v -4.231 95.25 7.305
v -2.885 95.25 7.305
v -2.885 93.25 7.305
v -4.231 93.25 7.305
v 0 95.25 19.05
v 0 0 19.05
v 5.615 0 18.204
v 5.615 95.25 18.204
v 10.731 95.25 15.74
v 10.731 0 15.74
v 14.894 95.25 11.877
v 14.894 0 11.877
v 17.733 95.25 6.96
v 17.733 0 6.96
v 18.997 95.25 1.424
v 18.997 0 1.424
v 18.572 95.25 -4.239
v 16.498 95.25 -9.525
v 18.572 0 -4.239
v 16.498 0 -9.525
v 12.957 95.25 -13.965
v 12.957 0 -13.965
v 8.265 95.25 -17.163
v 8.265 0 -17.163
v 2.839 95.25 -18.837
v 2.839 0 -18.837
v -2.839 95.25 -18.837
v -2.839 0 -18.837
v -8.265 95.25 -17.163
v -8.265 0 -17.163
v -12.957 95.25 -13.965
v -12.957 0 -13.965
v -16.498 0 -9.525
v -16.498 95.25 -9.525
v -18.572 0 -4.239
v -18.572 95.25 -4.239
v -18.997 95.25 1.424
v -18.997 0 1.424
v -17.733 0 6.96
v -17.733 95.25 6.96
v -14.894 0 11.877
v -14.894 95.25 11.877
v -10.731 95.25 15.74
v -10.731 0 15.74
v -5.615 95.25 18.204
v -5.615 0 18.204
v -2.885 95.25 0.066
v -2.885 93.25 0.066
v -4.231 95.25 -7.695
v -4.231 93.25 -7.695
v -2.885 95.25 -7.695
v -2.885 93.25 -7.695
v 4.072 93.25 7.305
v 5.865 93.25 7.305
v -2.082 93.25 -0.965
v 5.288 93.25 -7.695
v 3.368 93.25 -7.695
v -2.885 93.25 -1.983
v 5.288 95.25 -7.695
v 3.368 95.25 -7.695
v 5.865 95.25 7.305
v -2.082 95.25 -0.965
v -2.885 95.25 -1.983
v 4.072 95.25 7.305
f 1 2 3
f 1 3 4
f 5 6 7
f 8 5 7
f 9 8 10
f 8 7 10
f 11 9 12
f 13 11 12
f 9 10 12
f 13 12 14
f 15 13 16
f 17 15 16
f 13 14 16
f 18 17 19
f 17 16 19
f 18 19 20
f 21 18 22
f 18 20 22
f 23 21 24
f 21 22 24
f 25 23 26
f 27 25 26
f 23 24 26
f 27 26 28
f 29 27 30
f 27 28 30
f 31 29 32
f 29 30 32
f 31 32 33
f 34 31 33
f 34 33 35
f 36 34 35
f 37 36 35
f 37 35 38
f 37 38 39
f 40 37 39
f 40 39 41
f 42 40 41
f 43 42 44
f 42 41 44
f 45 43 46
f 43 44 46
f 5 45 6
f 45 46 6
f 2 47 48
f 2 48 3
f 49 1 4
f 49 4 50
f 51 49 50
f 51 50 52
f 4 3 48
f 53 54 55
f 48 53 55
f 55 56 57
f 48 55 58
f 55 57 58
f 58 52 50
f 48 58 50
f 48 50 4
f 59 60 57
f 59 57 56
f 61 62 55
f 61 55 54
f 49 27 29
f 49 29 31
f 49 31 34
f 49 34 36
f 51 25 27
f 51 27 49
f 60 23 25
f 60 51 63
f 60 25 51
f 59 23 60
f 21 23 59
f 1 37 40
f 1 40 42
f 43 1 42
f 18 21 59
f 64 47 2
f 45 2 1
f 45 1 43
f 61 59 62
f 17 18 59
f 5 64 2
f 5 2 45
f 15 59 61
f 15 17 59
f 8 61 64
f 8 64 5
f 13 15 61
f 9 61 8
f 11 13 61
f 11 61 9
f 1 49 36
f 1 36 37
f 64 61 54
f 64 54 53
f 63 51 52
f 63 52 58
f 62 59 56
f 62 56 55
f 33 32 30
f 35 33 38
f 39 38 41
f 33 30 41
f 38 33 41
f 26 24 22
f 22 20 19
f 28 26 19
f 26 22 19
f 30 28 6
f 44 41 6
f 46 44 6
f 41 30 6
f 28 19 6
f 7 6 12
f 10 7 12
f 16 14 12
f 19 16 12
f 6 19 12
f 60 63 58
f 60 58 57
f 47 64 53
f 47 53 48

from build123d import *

# Parameters (mm, degrees)
SKETCH1_R           = 19.05
BOSS_EXTRUDE1_DEPTH = 95.25
CUT_EXTRUDE1_DEPTH  = 2


with BuildPart() as part:
    # Sketch1 → Boss-Extrude1 (new body)
    with BuildSketch(Plane(origin=(0, 0, 0), x_dir=(1, 0, 0), z_dir=(0, 1, 0))):
        with Locations(Location((0, 0, 0), (0, 0, 270))):
            Circle(SKETCH1_R)
    extrude(amount=BOSS_EXTRUDE1_DEPTH)

    # Sketch2 → Cut-Extrude1 (cut)
    with BuildSketch(Plane(origin=(0, 95.25, 0), x_dir=(1, 0, 0), z_dir=(0, 1, 0))):
        Polygon((-4.230769231, 7.695432728), (-2.884615385, 7.695432728), (-2.884615385, 1.983293305), (3.368389423, 7.695432728), (5.288461538, 7.695432728), (-2.082331731, 0.964663498), (5.865384615, -7.304567272), (4.071514423, -7.304567272), (-2.884615385, -0.065985541), (-2.884615385, -7.304567272), (-4.230769231, -7.304567272), align=None)
    extrude(amount=-CUT_EXTRUDE1_DEPTH, mode=Mode.SUBTRACT)


solid = part.part
